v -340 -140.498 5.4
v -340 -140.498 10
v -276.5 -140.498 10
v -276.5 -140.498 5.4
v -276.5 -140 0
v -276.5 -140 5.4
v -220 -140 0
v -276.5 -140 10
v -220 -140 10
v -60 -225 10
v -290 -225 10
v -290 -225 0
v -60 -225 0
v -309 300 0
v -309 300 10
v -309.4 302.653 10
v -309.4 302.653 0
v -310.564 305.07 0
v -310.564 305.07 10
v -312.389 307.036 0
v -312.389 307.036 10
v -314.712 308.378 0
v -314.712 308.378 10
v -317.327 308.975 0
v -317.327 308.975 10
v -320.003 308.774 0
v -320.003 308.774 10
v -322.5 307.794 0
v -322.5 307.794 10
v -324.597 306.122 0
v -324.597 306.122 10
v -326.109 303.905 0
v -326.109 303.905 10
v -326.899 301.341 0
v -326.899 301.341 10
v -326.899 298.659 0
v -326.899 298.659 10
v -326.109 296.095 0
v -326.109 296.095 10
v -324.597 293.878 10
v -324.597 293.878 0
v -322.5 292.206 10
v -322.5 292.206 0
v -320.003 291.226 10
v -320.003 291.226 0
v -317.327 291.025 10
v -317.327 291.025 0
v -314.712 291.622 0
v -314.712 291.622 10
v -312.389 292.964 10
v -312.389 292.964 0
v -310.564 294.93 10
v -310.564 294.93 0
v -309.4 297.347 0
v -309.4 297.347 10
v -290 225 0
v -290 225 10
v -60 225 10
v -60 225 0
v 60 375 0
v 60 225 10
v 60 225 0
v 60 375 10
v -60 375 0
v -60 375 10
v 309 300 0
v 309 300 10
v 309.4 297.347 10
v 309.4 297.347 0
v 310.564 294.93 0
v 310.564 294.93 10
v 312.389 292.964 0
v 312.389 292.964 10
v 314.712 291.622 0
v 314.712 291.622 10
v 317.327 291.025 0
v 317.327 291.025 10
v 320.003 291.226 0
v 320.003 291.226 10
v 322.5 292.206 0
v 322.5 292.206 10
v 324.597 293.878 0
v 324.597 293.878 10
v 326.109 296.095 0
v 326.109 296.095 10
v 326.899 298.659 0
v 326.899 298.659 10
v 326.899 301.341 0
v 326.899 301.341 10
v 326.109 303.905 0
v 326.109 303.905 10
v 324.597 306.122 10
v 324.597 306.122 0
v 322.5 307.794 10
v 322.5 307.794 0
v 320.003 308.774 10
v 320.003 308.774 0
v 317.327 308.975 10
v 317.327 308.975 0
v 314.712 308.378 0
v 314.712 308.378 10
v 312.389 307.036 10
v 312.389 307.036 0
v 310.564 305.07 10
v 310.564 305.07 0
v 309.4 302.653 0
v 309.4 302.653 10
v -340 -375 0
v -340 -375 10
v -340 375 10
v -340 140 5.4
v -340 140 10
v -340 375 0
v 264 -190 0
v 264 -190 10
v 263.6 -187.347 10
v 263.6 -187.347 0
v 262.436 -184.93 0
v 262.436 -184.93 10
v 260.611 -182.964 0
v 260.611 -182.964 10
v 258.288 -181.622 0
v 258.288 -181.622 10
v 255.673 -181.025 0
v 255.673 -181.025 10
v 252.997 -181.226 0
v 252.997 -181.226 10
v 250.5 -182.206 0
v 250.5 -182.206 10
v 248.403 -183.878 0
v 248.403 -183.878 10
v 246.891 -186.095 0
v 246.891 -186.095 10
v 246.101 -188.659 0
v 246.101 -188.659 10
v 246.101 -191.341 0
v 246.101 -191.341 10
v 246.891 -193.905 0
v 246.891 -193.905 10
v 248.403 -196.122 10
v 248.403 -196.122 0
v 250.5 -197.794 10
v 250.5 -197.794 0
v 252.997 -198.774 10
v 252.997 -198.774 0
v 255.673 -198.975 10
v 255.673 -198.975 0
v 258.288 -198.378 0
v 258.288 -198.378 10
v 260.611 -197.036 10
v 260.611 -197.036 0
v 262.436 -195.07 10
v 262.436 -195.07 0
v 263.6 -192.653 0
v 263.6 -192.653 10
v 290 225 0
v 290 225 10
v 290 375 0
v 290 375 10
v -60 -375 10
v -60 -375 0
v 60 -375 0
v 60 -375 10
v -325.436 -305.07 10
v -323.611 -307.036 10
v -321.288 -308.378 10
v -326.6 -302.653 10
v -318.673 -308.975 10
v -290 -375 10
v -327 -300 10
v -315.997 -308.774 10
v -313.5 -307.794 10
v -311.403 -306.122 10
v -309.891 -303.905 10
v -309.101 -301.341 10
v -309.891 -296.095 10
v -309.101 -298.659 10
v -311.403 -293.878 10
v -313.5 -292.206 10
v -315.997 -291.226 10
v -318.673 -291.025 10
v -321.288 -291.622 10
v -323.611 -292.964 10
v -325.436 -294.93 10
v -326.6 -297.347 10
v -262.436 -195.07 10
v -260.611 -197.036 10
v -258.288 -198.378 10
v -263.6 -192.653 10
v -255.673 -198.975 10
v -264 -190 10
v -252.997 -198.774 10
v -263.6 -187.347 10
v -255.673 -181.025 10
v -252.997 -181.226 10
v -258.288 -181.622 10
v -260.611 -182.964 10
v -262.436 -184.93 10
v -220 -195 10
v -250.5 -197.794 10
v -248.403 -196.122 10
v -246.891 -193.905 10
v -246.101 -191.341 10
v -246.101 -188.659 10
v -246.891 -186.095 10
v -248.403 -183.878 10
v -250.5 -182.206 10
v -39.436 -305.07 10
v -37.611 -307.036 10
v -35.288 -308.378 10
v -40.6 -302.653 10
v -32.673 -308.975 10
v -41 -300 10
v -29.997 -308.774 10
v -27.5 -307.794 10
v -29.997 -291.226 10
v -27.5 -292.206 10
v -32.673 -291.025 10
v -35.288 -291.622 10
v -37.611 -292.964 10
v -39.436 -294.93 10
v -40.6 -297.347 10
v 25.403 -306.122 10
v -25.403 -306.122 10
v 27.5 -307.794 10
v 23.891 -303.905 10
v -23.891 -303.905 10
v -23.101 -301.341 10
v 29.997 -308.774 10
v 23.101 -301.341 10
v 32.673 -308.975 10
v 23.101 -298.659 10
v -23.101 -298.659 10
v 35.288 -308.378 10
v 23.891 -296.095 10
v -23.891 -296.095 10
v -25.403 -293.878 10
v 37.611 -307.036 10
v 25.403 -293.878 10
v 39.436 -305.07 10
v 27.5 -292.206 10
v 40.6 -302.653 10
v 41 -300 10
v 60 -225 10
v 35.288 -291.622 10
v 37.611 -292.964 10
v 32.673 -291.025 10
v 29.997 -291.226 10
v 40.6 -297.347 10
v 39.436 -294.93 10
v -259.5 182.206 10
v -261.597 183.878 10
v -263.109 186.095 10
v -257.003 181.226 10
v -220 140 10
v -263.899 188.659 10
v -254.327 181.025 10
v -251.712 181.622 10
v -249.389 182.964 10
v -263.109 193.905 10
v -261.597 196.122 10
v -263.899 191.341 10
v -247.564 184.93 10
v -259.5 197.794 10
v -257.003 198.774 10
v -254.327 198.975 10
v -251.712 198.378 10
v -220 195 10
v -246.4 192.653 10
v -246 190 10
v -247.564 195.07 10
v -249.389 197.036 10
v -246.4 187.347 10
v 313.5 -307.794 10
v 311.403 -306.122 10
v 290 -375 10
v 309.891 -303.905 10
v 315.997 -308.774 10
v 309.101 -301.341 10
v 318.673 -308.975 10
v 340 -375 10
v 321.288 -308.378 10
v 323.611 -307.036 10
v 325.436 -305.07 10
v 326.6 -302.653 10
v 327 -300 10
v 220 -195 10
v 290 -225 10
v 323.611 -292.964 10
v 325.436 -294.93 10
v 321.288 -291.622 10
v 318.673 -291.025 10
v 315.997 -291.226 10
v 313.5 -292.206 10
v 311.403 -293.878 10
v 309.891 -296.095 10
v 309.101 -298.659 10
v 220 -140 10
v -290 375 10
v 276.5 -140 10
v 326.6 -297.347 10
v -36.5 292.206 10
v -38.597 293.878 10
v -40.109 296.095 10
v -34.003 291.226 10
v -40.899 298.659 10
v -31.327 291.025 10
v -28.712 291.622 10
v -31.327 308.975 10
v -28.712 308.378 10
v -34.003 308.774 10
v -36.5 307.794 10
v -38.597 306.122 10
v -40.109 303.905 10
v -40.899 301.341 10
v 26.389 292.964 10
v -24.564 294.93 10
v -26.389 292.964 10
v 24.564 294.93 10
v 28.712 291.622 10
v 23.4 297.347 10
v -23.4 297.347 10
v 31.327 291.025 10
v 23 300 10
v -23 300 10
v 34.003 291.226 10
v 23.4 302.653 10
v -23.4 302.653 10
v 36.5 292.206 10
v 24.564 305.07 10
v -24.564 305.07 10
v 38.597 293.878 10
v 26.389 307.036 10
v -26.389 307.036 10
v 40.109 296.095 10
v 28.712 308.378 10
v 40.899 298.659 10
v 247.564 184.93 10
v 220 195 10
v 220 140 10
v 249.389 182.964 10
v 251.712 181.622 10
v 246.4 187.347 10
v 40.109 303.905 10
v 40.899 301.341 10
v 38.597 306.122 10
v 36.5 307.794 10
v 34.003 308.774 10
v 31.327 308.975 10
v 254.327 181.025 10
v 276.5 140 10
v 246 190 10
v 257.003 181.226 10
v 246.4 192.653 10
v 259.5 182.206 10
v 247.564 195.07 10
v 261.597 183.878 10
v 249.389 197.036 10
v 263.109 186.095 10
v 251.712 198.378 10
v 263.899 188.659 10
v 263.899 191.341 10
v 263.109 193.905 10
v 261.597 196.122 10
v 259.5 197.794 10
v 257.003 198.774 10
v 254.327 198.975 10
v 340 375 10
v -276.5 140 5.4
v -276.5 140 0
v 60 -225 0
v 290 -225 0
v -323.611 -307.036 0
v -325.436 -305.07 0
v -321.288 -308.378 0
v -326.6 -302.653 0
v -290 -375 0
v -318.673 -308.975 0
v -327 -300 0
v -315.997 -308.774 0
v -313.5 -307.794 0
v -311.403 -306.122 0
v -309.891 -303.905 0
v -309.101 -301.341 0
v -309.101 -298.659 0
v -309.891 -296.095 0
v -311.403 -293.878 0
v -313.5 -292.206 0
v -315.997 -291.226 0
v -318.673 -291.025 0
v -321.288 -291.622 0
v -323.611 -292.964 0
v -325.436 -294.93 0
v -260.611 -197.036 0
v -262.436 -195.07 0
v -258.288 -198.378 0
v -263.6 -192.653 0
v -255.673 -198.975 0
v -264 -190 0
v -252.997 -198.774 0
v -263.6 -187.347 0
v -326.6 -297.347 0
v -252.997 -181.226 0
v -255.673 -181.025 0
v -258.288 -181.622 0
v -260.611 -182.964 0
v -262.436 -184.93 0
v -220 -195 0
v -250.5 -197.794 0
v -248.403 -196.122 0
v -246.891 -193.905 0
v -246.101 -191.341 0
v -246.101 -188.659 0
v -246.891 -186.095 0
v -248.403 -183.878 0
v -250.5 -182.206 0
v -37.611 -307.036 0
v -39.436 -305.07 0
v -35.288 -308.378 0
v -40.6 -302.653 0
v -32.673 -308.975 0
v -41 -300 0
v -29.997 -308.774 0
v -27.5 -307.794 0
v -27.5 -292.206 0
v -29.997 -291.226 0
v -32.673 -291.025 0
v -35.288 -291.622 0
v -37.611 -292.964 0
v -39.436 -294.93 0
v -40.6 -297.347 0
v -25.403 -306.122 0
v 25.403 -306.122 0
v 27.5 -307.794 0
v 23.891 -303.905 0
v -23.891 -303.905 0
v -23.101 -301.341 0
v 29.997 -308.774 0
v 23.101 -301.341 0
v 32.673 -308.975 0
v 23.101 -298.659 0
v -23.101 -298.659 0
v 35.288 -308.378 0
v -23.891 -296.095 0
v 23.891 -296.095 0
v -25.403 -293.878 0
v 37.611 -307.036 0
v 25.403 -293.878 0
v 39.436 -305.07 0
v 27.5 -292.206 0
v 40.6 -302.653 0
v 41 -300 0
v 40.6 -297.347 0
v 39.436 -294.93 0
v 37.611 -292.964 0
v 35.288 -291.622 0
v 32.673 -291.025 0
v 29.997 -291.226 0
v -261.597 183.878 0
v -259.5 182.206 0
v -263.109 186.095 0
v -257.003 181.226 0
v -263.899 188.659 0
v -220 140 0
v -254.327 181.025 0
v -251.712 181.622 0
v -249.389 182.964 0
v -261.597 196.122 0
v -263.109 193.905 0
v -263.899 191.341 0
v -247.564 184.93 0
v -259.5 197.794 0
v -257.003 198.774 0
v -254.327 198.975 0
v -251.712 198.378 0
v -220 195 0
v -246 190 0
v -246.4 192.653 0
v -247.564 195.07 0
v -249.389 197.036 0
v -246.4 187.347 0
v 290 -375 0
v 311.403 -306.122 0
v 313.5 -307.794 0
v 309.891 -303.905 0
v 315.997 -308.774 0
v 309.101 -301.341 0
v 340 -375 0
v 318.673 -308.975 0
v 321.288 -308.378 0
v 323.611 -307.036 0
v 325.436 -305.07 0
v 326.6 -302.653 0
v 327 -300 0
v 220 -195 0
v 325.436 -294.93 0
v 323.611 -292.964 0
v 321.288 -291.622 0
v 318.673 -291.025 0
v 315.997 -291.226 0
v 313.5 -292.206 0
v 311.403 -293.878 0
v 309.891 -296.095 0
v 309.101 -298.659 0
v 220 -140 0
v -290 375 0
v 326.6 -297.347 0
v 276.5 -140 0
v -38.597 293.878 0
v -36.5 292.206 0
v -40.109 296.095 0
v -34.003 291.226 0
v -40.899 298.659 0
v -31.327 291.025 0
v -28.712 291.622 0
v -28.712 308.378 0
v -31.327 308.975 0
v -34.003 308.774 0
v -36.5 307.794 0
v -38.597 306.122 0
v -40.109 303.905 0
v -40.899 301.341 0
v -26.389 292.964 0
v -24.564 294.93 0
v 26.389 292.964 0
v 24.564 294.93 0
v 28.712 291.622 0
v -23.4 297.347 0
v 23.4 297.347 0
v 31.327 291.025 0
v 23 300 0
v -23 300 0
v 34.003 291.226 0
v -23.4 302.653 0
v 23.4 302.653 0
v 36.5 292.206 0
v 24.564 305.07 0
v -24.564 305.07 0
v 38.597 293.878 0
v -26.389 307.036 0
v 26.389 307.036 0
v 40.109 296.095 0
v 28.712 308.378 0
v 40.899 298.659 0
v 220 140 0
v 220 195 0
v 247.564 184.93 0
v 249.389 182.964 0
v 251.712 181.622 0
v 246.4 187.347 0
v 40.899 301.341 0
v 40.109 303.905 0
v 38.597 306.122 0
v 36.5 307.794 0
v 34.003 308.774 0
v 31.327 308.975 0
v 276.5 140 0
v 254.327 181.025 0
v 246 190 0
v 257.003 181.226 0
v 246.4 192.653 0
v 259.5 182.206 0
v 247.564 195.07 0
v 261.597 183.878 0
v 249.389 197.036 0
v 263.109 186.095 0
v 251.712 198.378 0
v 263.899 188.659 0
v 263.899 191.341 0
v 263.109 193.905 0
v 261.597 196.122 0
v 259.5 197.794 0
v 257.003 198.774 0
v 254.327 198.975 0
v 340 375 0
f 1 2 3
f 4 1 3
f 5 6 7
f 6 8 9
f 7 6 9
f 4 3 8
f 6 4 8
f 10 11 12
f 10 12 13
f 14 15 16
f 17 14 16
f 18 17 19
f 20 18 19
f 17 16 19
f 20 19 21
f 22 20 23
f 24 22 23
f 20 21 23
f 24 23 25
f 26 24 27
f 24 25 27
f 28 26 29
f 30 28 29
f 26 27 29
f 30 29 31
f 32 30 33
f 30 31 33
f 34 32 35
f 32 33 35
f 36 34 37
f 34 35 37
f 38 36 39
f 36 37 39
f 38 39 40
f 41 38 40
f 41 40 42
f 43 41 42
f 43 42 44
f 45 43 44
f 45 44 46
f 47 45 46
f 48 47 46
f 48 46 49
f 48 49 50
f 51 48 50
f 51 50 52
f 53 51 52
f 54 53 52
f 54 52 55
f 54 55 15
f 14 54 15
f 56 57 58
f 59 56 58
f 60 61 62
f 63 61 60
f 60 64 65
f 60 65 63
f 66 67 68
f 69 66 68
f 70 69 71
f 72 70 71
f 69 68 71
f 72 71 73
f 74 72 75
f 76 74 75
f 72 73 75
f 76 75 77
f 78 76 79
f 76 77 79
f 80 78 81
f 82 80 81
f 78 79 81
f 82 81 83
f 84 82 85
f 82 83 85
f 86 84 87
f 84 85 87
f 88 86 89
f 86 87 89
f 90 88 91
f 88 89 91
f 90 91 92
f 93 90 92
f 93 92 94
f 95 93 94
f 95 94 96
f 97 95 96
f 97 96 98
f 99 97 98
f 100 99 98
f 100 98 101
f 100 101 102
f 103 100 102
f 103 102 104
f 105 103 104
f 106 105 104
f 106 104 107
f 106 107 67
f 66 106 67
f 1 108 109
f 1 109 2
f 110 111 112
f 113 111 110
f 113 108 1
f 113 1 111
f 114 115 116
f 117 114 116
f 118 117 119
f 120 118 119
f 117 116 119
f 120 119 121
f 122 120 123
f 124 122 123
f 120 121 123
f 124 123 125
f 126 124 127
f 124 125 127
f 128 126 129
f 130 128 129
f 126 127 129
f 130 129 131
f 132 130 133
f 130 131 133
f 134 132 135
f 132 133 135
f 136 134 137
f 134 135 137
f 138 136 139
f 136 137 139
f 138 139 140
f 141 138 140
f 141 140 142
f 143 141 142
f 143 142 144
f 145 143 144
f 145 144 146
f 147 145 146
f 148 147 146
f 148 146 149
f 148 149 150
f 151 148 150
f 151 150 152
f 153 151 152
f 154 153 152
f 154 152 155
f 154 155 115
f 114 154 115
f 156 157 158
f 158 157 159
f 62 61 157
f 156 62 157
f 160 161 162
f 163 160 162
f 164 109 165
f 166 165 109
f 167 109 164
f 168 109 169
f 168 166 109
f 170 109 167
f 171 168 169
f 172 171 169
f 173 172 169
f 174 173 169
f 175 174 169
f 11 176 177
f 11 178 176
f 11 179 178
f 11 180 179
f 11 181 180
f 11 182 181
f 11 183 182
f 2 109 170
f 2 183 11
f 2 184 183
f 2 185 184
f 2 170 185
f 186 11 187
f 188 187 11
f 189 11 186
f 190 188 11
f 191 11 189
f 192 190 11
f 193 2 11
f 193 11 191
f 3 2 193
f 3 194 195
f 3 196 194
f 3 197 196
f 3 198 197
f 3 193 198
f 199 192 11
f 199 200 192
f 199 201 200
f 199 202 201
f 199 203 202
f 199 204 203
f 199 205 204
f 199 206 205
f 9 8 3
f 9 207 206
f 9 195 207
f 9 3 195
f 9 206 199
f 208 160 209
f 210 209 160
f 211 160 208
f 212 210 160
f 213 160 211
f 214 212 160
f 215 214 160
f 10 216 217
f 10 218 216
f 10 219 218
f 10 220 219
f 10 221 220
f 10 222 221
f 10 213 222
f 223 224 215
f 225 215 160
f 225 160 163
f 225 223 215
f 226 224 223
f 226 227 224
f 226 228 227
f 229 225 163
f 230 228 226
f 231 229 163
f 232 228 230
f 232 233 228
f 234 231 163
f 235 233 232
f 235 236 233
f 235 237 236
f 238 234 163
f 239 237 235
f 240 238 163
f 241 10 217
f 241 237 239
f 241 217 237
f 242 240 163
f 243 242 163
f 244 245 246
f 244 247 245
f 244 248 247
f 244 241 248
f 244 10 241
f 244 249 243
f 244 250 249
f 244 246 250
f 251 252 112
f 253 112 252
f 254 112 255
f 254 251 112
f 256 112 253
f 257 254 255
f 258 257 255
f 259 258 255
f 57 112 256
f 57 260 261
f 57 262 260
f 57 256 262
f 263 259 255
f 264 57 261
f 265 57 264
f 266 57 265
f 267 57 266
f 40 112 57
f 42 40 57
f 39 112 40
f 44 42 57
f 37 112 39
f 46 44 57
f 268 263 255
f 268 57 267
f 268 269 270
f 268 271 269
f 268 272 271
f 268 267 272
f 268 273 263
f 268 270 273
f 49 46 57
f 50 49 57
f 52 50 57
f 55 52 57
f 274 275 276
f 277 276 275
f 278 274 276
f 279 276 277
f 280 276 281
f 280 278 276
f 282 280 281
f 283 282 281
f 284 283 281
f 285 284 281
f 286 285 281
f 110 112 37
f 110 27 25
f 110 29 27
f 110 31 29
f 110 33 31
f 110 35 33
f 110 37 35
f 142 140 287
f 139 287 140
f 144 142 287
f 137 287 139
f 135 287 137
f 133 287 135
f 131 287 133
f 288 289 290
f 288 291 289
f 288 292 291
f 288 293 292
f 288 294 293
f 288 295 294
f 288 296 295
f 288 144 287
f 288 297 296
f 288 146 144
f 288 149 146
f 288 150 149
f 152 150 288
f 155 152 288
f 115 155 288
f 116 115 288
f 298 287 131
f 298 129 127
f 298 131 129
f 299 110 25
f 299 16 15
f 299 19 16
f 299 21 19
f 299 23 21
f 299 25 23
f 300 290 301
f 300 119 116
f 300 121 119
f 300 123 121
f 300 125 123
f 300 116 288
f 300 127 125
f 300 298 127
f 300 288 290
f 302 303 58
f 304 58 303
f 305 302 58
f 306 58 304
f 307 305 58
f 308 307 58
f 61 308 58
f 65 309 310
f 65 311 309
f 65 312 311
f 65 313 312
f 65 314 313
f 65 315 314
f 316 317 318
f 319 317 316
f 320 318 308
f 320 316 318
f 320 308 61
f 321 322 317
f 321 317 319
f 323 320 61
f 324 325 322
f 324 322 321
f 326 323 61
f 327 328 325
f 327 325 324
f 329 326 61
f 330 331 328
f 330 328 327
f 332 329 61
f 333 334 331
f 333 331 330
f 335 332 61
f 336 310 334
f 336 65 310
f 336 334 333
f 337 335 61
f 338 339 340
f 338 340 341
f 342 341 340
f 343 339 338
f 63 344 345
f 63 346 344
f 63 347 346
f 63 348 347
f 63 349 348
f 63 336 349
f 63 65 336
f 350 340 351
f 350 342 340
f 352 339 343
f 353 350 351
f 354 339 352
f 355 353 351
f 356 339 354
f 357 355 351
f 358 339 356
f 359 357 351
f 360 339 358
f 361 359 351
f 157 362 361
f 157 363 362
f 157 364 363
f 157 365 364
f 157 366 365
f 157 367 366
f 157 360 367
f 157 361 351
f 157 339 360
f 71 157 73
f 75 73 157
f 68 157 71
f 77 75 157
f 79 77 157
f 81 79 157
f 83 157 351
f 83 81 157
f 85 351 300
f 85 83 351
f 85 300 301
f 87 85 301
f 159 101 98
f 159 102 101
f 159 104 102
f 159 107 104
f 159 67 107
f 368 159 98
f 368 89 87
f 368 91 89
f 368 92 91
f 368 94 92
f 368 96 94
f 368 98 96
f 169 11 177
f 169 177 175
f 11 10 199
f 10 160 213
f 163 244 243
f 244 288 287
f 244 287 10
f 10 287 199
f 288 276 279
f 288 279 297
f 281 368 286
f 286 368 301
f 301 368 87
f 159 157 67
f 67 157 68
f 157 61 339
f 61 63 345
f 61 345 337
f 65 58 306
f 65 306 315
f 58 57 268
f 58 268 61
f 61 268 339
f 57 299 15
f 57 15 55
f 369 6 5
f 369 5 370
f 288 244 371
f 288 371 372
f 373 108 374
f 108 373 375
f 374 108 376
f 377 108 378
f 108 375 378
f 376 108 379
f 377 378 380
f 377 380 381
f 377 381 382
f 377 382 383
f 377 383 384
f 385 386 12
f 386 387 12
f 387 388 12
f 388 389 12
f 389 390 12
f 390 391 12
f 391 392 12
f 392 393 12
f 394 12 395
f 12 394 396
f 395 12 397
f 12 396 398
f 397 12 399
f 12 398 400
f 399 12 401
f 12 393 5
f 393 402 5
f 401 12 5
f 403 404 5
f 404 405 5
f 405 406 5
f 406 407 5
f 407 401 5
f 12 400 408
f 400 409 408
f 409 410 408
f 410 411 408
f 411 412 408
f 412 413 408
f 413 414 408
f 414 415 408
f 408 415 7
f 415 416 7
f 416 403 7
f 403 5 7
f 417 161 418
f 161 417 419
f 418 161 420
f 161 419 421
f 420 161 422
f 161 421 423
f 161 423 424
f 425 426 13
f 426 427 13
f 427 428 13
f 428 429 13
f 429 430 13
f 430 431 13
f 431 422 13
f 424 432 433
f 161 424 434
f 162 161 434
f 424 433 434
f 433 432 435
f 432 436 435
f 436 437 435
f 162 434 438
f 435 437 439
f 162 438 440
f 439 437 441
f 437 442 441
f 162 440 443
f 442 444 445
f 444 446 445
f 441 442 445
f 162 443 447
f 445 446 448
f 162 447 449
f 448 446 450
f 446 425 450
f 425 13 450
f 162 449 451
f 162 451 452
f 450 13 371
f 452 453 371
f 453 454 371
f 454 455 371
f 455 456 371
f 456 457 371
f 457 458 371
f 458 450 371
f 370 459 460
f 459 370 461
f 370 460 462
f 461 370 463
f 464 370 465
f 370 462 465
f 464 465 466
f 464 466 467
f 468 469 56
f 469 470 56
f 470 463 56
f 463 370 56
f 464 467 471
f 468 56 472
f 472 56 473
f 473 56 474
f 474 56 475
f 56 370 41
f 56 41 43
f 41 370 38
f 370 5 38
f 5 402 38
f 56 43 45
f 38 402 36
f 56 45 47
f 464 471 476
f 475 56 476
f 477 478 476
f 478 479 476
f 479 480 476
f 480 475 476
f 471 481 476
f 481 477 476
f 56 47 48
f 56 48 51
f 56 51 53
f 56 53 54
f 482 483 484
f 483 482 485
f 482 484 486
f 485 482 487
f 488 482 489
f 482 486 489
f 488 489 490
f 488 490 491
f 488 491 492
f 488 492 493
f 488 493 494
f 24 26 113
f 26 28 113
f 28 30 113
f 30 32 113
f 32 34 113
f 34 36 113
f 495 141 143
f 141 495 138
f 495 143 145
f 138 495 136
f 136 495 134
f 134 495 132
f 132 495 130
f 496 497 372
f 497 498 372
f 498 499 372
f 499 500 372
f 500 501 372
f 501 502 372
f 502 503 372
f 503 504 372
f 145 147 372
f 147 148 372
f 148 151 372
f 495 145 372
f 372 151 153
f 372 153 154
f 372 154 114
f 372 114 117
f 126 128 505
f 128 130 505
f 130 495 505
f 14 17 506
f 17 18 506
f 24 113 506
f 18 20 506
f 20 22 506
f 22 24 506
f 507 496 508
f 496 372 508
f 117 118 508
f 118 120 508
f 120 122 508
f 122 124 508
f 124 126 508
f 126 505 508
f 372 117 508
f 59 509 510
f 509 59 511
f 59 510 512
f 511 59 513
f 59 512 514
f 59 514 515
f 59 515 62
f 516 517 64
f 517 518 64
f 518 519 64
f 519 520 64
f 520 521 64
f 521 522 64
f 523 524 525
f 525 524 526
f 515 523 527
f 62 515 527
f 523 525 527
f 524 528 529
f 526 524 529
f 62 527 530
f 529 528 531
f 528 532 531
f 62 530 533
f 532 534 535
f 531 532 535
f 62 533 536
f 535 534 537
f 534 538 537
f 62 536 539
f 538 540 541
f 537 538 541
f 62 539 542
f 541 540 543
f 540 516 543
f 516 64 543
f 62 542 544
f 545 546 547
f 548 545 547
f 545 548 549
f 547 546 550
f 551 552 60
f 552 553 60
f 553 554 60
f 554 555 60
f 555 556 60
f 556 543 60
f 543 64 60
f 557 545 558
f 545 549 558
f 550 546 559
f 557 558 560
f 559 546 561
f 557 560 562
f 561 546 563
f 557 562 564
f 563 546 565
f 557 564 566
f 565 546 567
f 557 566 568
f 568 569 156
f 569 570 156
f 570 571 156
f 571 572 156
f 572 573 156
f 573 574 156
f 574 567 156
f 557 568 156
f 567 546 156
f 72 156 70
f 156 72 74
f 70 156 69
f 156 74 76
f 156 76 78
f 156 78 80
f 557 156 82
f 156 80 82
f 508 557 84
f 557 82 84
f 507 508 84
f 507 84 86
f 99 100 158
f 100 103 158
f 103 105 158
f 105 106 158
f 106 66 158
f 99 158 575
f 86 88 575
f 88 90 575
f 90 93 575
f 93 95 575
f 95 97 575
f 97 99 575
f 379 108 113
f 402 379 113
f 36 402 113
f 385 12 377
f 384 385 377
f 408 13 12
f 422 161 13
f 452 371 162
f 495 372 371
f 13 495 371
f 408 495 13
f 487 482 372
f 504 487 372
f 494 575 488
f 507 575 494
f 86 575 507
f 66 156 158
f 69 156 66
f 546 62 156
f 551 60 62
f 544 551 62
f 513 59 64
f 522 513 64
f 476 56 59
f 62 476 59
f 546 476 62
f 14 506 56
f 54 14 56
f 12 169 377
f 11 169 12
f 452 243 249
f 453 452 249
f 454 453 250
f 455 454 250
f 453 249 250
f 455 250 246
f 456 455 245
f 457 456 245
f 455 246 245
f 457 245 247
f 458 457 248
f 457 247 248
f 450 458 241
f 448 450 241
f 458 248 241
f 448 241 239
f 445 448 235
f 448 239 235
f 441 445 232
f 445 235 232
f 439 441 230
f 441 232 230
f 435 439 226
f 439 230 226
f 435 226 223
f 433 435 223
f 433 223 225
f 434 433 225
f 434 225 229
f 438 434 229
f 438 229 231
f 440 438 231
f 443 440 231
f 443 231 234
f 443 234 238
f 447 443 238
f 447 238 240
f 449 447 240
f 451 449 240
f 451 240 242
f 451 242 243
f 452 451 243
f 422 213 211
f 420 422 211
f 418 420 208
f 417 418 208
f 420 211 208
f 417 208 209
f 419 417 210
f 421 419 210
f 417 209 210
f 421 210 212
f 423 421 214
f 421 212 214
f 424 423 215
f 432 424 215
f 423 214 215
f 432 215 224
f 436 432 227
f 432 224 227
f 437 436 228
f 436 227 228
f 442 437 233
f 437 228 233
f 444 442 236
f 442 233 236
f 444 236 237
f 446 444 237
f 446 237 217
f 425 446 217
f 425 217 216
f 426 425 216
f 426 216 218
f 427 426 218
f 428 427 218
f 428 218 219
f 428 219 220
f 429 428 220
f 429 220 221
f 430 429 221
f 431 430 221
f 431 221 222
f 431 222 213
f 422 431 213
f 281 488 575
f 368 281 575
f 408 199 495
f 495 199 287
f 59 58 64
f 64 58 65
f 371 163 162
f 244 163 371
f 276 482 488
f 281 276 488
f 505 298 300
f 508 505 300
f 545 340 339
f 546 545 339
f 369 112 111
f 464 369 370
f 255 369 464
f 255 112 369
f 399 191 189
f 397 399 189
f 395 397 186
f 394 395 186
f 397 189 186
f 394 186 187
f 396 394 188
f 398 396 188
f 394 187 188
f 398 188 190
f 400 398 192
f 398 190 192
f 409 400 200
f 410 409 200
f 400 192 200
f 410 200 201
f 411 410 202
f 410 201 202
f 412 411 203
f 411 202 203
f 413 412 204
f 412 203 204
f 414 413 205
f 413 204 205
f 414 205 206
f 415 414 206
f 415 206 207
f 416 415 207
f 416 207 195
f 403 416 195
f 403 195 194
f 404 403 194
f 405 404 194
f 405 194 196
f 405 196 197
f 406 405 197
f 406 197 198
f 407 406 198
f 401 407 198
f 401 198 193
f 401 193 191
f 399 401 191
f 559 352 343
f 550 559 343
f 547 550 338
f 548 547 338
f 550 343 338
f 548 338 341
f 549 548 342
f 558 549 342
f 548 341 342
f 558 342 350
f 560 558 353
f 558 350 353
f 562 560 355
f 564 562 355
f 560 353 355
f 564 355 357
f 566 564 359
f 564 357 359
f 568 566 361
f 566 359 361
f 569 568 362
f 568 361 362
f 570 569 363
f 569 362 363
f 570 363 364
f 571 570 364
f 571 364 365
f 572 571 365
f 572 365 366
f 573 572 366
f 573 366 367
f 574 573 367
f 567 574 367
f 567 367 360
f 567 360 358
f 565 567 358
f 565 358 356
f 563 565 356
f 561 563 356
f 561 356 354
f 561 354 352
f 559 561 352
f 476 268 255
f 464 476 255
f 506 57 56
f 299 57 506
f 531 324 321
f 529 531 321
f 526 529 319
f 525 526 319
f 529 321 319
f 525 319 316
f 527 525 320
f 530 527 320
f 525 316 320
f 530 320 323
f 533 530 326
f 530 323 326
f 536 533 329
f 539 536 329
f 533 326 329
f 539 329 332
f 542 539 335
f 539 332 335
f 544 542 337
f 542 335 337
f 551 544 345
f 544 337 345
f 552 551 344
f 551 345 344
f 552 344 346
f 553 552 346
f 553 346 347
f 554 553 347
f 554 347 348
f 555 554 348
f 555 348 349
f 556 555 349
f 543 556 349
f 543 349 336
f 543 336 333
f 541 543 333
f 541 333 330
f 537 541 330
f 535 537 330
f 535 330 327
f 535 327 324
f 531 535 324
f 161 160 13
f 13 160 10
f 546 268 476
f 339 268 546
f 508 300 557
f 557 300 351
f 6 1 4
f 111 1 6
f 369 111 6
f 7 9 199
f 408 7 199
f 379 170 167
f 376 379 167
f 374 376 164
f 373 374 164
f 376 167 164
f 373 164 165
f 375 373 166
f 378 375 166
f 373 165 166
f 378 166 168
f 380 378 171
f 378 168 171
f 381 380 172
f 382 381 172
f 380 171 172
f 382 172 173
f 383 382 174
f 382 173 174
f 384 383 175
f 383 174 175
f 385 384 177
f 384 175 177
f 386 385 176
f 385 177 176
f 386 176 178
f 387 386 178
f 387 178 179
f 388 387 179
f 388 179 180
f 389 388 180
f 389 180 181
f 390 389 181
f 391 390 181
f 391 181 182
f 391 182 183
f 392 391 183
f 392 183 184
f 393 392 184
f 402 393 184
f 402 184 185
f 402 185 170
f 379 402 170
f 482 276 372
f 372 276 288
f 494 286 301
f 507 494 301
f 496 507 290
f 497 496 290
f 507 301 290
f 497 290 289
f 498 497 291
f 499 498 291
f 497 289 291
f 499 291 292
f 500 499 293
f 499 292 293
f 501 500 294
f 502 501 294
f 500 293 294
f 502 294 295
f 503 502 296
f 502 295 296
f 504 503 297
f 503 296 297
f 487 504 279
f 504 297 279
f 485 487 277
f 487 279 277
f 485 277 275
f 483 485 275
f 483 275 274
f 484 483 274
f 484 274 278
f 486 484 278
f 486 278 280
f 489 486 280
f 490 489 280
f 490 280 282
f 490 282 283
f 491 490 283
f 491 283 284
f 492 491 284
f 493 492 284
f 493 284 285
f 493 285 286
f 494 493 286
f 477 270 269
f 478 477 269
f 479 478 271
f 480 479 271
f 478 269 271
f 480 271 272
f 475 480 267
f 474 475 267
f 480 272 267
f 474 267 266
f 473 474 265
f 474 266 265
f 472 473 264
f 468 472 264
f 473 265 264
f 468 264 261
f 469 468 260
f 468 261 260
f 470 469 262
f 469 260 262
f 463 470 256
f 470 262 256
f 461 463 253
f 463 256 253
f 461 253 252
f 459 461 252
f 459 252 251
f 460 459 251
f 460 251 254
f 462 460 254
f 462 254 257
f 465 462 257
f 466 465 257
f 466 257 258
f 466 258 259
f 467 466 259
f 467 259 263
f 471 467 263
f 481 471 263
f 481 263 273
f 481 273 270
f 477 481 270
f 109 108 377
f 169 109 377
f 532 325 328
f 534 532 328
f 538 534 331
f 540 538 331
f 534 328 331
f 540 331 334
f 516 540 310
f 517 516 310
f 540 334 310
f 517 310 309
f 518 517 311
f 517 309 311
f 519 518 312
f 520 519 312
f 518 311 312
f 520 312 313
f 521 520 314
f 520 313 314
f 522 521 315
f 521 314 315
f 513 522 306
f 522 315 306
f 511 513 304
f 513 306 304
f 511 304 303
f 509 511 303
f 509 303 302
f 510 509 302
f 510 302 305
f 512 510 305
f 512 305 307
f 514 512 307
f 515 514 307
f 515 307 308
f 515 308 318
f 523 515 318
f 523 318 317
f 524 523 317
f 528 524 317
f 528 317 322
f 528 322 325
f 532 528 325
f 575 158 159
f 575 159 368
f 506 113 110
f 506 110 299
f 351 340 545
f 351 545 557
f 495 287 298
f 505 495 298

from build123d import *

# Parameters (mm, degrees)
SKETCH2_W           = 680
SKETCH2_H           = 750
BOSS_EXTRUDE1_DEPTH = 10
SKETCH3_W           = 230
SKETCH3_H           = 150
CUT_EXTRUDE1_DEPTH  = 507.285492583
SKETCH4_R           = 9
CUT_EXTRUDE4_DEPTH  = 507.285492583
SKETCH6_W           = 440
SKETCH6_H           = 280
SKETCH6_H_2         = 55
SKETCH6_W_2         = 56.5
CUT_EXTRUDE6_DEPTH  = 507.285492583
SKETCH7_W           = 63.5
SKETCH7_H           = 280.49751631
CUT_EXTRUDE7_DEPTH  = 4.6


with BuildPart() as part:
    # Sketch2 → Boss-Extrude1 (new body)
    with BuildSketch(Plane.XY):
        Rectangle(SKETCH2_W, SKETCH2_H)
    extrude(amount=BOSS_EXTRUDE1_DEPTH)

    # Sketch3 → Cut-Extrude1 (cut, through all)
    with BuildSketch(Plane.XY.offset(10)):
        with Locations((-175, 300)):
            Rectangle(SKETCH3_W, SKETCH3_H)
        with Locations((175, 300)):
            Rectangle(SKETCH3_W, SKETCH3_H)
        with Locations((175, -300)):
            Rectangle(SKETCH3_W, SKETCH3_H)
        with Locations((-175, -300)):
            Rectangle(SKETCH3_W, SKETCH3_H)
    extrude(amount=-CUT_EXTRUDE1_DEPTH, mode=Mode.SUBTRACT)

    # Sketch4 → Cut-Extrude4 (cut, through all)
    with BuildSketch(Plane.XY.offset(10)):
        with Locations((-318, 300)):
            Circle(SKETCH4_R)
        with Locations((-32, 300)):
            Circle(SKETCH4_R)
        with Locations((-255, 190)):
            Circle(SKETCH4_R)
        with Locations(Location((318, 300, 0), (0, 0, 180))):
            Circle(SKETCH4_R)
        with Locations(Location((255, 190, 0), (0, 0, 180))):
            Circle(SKETCH4_R)
        with Locations(Location((32, 300, 0), (0, 0, 180))):
            Circle(SKETCH4_R)
        with Locations((318, -300)):
            Circle(SKETCH4_R)
        with Locations((255, -190)):
            Circle(SKETCH4_R)
        with Locations((32, -300)):
            Circle(SKETCH4_R)
        with Locations(Location((-255, -190, 0), (0, 0, 180))):
            Circle(SKETCH4_R)
        with Locations(Location((-32, -300, 0), (0, 0, 180))):
            Circle(SKETCH4_R)
        with Locations(Location((-318, -300, 0), (0, 0, 180))):
            Circle(SKETCH4_R)
    extrude(amount=-CUT_EXTRUDE4_DEPTH, mode=Mode.SUBTRACT)

    # Sketch6 → Cut-Extrude6 (cut, through all)
    with BuildSketch(Plane.XY.offset(10)):
        Rectangle(SKETCH6_W, SKETCH6_H)
        with Locations((0, 167.5)):
            Rectangle(SKETCH6_W, SKETCH6_H_2)
        with Locations((0, -167.5)):
            Rectangle(SKETCH6_W, SKETCH6_H_2)
        with Locations((248.25, 0)):
            Rectangle(SKETCH6_W_2, SKETCH6_H)
        with Locations((-248.25, 0)):
            Rectangle(SKETCH6_W_2, SKETCH6_H)
    extrude(amount=-CUT_EXTRUDE6_DEPTH, mode=Mode.SUBTRACT)

    # Sketch7 → Cut-Extrude7 (cut)
    with BuildSketch(Plane.XY.offset(10)):
        with Locations((-308.25, -0.248758155)):
            Rectangle(SKETCH7_W, SKETCH7_H)
    extrude(amount=-CUT_EXTRUDE7_DEPTH, mode=Mode.SUBTRACT)


solid = part.part
